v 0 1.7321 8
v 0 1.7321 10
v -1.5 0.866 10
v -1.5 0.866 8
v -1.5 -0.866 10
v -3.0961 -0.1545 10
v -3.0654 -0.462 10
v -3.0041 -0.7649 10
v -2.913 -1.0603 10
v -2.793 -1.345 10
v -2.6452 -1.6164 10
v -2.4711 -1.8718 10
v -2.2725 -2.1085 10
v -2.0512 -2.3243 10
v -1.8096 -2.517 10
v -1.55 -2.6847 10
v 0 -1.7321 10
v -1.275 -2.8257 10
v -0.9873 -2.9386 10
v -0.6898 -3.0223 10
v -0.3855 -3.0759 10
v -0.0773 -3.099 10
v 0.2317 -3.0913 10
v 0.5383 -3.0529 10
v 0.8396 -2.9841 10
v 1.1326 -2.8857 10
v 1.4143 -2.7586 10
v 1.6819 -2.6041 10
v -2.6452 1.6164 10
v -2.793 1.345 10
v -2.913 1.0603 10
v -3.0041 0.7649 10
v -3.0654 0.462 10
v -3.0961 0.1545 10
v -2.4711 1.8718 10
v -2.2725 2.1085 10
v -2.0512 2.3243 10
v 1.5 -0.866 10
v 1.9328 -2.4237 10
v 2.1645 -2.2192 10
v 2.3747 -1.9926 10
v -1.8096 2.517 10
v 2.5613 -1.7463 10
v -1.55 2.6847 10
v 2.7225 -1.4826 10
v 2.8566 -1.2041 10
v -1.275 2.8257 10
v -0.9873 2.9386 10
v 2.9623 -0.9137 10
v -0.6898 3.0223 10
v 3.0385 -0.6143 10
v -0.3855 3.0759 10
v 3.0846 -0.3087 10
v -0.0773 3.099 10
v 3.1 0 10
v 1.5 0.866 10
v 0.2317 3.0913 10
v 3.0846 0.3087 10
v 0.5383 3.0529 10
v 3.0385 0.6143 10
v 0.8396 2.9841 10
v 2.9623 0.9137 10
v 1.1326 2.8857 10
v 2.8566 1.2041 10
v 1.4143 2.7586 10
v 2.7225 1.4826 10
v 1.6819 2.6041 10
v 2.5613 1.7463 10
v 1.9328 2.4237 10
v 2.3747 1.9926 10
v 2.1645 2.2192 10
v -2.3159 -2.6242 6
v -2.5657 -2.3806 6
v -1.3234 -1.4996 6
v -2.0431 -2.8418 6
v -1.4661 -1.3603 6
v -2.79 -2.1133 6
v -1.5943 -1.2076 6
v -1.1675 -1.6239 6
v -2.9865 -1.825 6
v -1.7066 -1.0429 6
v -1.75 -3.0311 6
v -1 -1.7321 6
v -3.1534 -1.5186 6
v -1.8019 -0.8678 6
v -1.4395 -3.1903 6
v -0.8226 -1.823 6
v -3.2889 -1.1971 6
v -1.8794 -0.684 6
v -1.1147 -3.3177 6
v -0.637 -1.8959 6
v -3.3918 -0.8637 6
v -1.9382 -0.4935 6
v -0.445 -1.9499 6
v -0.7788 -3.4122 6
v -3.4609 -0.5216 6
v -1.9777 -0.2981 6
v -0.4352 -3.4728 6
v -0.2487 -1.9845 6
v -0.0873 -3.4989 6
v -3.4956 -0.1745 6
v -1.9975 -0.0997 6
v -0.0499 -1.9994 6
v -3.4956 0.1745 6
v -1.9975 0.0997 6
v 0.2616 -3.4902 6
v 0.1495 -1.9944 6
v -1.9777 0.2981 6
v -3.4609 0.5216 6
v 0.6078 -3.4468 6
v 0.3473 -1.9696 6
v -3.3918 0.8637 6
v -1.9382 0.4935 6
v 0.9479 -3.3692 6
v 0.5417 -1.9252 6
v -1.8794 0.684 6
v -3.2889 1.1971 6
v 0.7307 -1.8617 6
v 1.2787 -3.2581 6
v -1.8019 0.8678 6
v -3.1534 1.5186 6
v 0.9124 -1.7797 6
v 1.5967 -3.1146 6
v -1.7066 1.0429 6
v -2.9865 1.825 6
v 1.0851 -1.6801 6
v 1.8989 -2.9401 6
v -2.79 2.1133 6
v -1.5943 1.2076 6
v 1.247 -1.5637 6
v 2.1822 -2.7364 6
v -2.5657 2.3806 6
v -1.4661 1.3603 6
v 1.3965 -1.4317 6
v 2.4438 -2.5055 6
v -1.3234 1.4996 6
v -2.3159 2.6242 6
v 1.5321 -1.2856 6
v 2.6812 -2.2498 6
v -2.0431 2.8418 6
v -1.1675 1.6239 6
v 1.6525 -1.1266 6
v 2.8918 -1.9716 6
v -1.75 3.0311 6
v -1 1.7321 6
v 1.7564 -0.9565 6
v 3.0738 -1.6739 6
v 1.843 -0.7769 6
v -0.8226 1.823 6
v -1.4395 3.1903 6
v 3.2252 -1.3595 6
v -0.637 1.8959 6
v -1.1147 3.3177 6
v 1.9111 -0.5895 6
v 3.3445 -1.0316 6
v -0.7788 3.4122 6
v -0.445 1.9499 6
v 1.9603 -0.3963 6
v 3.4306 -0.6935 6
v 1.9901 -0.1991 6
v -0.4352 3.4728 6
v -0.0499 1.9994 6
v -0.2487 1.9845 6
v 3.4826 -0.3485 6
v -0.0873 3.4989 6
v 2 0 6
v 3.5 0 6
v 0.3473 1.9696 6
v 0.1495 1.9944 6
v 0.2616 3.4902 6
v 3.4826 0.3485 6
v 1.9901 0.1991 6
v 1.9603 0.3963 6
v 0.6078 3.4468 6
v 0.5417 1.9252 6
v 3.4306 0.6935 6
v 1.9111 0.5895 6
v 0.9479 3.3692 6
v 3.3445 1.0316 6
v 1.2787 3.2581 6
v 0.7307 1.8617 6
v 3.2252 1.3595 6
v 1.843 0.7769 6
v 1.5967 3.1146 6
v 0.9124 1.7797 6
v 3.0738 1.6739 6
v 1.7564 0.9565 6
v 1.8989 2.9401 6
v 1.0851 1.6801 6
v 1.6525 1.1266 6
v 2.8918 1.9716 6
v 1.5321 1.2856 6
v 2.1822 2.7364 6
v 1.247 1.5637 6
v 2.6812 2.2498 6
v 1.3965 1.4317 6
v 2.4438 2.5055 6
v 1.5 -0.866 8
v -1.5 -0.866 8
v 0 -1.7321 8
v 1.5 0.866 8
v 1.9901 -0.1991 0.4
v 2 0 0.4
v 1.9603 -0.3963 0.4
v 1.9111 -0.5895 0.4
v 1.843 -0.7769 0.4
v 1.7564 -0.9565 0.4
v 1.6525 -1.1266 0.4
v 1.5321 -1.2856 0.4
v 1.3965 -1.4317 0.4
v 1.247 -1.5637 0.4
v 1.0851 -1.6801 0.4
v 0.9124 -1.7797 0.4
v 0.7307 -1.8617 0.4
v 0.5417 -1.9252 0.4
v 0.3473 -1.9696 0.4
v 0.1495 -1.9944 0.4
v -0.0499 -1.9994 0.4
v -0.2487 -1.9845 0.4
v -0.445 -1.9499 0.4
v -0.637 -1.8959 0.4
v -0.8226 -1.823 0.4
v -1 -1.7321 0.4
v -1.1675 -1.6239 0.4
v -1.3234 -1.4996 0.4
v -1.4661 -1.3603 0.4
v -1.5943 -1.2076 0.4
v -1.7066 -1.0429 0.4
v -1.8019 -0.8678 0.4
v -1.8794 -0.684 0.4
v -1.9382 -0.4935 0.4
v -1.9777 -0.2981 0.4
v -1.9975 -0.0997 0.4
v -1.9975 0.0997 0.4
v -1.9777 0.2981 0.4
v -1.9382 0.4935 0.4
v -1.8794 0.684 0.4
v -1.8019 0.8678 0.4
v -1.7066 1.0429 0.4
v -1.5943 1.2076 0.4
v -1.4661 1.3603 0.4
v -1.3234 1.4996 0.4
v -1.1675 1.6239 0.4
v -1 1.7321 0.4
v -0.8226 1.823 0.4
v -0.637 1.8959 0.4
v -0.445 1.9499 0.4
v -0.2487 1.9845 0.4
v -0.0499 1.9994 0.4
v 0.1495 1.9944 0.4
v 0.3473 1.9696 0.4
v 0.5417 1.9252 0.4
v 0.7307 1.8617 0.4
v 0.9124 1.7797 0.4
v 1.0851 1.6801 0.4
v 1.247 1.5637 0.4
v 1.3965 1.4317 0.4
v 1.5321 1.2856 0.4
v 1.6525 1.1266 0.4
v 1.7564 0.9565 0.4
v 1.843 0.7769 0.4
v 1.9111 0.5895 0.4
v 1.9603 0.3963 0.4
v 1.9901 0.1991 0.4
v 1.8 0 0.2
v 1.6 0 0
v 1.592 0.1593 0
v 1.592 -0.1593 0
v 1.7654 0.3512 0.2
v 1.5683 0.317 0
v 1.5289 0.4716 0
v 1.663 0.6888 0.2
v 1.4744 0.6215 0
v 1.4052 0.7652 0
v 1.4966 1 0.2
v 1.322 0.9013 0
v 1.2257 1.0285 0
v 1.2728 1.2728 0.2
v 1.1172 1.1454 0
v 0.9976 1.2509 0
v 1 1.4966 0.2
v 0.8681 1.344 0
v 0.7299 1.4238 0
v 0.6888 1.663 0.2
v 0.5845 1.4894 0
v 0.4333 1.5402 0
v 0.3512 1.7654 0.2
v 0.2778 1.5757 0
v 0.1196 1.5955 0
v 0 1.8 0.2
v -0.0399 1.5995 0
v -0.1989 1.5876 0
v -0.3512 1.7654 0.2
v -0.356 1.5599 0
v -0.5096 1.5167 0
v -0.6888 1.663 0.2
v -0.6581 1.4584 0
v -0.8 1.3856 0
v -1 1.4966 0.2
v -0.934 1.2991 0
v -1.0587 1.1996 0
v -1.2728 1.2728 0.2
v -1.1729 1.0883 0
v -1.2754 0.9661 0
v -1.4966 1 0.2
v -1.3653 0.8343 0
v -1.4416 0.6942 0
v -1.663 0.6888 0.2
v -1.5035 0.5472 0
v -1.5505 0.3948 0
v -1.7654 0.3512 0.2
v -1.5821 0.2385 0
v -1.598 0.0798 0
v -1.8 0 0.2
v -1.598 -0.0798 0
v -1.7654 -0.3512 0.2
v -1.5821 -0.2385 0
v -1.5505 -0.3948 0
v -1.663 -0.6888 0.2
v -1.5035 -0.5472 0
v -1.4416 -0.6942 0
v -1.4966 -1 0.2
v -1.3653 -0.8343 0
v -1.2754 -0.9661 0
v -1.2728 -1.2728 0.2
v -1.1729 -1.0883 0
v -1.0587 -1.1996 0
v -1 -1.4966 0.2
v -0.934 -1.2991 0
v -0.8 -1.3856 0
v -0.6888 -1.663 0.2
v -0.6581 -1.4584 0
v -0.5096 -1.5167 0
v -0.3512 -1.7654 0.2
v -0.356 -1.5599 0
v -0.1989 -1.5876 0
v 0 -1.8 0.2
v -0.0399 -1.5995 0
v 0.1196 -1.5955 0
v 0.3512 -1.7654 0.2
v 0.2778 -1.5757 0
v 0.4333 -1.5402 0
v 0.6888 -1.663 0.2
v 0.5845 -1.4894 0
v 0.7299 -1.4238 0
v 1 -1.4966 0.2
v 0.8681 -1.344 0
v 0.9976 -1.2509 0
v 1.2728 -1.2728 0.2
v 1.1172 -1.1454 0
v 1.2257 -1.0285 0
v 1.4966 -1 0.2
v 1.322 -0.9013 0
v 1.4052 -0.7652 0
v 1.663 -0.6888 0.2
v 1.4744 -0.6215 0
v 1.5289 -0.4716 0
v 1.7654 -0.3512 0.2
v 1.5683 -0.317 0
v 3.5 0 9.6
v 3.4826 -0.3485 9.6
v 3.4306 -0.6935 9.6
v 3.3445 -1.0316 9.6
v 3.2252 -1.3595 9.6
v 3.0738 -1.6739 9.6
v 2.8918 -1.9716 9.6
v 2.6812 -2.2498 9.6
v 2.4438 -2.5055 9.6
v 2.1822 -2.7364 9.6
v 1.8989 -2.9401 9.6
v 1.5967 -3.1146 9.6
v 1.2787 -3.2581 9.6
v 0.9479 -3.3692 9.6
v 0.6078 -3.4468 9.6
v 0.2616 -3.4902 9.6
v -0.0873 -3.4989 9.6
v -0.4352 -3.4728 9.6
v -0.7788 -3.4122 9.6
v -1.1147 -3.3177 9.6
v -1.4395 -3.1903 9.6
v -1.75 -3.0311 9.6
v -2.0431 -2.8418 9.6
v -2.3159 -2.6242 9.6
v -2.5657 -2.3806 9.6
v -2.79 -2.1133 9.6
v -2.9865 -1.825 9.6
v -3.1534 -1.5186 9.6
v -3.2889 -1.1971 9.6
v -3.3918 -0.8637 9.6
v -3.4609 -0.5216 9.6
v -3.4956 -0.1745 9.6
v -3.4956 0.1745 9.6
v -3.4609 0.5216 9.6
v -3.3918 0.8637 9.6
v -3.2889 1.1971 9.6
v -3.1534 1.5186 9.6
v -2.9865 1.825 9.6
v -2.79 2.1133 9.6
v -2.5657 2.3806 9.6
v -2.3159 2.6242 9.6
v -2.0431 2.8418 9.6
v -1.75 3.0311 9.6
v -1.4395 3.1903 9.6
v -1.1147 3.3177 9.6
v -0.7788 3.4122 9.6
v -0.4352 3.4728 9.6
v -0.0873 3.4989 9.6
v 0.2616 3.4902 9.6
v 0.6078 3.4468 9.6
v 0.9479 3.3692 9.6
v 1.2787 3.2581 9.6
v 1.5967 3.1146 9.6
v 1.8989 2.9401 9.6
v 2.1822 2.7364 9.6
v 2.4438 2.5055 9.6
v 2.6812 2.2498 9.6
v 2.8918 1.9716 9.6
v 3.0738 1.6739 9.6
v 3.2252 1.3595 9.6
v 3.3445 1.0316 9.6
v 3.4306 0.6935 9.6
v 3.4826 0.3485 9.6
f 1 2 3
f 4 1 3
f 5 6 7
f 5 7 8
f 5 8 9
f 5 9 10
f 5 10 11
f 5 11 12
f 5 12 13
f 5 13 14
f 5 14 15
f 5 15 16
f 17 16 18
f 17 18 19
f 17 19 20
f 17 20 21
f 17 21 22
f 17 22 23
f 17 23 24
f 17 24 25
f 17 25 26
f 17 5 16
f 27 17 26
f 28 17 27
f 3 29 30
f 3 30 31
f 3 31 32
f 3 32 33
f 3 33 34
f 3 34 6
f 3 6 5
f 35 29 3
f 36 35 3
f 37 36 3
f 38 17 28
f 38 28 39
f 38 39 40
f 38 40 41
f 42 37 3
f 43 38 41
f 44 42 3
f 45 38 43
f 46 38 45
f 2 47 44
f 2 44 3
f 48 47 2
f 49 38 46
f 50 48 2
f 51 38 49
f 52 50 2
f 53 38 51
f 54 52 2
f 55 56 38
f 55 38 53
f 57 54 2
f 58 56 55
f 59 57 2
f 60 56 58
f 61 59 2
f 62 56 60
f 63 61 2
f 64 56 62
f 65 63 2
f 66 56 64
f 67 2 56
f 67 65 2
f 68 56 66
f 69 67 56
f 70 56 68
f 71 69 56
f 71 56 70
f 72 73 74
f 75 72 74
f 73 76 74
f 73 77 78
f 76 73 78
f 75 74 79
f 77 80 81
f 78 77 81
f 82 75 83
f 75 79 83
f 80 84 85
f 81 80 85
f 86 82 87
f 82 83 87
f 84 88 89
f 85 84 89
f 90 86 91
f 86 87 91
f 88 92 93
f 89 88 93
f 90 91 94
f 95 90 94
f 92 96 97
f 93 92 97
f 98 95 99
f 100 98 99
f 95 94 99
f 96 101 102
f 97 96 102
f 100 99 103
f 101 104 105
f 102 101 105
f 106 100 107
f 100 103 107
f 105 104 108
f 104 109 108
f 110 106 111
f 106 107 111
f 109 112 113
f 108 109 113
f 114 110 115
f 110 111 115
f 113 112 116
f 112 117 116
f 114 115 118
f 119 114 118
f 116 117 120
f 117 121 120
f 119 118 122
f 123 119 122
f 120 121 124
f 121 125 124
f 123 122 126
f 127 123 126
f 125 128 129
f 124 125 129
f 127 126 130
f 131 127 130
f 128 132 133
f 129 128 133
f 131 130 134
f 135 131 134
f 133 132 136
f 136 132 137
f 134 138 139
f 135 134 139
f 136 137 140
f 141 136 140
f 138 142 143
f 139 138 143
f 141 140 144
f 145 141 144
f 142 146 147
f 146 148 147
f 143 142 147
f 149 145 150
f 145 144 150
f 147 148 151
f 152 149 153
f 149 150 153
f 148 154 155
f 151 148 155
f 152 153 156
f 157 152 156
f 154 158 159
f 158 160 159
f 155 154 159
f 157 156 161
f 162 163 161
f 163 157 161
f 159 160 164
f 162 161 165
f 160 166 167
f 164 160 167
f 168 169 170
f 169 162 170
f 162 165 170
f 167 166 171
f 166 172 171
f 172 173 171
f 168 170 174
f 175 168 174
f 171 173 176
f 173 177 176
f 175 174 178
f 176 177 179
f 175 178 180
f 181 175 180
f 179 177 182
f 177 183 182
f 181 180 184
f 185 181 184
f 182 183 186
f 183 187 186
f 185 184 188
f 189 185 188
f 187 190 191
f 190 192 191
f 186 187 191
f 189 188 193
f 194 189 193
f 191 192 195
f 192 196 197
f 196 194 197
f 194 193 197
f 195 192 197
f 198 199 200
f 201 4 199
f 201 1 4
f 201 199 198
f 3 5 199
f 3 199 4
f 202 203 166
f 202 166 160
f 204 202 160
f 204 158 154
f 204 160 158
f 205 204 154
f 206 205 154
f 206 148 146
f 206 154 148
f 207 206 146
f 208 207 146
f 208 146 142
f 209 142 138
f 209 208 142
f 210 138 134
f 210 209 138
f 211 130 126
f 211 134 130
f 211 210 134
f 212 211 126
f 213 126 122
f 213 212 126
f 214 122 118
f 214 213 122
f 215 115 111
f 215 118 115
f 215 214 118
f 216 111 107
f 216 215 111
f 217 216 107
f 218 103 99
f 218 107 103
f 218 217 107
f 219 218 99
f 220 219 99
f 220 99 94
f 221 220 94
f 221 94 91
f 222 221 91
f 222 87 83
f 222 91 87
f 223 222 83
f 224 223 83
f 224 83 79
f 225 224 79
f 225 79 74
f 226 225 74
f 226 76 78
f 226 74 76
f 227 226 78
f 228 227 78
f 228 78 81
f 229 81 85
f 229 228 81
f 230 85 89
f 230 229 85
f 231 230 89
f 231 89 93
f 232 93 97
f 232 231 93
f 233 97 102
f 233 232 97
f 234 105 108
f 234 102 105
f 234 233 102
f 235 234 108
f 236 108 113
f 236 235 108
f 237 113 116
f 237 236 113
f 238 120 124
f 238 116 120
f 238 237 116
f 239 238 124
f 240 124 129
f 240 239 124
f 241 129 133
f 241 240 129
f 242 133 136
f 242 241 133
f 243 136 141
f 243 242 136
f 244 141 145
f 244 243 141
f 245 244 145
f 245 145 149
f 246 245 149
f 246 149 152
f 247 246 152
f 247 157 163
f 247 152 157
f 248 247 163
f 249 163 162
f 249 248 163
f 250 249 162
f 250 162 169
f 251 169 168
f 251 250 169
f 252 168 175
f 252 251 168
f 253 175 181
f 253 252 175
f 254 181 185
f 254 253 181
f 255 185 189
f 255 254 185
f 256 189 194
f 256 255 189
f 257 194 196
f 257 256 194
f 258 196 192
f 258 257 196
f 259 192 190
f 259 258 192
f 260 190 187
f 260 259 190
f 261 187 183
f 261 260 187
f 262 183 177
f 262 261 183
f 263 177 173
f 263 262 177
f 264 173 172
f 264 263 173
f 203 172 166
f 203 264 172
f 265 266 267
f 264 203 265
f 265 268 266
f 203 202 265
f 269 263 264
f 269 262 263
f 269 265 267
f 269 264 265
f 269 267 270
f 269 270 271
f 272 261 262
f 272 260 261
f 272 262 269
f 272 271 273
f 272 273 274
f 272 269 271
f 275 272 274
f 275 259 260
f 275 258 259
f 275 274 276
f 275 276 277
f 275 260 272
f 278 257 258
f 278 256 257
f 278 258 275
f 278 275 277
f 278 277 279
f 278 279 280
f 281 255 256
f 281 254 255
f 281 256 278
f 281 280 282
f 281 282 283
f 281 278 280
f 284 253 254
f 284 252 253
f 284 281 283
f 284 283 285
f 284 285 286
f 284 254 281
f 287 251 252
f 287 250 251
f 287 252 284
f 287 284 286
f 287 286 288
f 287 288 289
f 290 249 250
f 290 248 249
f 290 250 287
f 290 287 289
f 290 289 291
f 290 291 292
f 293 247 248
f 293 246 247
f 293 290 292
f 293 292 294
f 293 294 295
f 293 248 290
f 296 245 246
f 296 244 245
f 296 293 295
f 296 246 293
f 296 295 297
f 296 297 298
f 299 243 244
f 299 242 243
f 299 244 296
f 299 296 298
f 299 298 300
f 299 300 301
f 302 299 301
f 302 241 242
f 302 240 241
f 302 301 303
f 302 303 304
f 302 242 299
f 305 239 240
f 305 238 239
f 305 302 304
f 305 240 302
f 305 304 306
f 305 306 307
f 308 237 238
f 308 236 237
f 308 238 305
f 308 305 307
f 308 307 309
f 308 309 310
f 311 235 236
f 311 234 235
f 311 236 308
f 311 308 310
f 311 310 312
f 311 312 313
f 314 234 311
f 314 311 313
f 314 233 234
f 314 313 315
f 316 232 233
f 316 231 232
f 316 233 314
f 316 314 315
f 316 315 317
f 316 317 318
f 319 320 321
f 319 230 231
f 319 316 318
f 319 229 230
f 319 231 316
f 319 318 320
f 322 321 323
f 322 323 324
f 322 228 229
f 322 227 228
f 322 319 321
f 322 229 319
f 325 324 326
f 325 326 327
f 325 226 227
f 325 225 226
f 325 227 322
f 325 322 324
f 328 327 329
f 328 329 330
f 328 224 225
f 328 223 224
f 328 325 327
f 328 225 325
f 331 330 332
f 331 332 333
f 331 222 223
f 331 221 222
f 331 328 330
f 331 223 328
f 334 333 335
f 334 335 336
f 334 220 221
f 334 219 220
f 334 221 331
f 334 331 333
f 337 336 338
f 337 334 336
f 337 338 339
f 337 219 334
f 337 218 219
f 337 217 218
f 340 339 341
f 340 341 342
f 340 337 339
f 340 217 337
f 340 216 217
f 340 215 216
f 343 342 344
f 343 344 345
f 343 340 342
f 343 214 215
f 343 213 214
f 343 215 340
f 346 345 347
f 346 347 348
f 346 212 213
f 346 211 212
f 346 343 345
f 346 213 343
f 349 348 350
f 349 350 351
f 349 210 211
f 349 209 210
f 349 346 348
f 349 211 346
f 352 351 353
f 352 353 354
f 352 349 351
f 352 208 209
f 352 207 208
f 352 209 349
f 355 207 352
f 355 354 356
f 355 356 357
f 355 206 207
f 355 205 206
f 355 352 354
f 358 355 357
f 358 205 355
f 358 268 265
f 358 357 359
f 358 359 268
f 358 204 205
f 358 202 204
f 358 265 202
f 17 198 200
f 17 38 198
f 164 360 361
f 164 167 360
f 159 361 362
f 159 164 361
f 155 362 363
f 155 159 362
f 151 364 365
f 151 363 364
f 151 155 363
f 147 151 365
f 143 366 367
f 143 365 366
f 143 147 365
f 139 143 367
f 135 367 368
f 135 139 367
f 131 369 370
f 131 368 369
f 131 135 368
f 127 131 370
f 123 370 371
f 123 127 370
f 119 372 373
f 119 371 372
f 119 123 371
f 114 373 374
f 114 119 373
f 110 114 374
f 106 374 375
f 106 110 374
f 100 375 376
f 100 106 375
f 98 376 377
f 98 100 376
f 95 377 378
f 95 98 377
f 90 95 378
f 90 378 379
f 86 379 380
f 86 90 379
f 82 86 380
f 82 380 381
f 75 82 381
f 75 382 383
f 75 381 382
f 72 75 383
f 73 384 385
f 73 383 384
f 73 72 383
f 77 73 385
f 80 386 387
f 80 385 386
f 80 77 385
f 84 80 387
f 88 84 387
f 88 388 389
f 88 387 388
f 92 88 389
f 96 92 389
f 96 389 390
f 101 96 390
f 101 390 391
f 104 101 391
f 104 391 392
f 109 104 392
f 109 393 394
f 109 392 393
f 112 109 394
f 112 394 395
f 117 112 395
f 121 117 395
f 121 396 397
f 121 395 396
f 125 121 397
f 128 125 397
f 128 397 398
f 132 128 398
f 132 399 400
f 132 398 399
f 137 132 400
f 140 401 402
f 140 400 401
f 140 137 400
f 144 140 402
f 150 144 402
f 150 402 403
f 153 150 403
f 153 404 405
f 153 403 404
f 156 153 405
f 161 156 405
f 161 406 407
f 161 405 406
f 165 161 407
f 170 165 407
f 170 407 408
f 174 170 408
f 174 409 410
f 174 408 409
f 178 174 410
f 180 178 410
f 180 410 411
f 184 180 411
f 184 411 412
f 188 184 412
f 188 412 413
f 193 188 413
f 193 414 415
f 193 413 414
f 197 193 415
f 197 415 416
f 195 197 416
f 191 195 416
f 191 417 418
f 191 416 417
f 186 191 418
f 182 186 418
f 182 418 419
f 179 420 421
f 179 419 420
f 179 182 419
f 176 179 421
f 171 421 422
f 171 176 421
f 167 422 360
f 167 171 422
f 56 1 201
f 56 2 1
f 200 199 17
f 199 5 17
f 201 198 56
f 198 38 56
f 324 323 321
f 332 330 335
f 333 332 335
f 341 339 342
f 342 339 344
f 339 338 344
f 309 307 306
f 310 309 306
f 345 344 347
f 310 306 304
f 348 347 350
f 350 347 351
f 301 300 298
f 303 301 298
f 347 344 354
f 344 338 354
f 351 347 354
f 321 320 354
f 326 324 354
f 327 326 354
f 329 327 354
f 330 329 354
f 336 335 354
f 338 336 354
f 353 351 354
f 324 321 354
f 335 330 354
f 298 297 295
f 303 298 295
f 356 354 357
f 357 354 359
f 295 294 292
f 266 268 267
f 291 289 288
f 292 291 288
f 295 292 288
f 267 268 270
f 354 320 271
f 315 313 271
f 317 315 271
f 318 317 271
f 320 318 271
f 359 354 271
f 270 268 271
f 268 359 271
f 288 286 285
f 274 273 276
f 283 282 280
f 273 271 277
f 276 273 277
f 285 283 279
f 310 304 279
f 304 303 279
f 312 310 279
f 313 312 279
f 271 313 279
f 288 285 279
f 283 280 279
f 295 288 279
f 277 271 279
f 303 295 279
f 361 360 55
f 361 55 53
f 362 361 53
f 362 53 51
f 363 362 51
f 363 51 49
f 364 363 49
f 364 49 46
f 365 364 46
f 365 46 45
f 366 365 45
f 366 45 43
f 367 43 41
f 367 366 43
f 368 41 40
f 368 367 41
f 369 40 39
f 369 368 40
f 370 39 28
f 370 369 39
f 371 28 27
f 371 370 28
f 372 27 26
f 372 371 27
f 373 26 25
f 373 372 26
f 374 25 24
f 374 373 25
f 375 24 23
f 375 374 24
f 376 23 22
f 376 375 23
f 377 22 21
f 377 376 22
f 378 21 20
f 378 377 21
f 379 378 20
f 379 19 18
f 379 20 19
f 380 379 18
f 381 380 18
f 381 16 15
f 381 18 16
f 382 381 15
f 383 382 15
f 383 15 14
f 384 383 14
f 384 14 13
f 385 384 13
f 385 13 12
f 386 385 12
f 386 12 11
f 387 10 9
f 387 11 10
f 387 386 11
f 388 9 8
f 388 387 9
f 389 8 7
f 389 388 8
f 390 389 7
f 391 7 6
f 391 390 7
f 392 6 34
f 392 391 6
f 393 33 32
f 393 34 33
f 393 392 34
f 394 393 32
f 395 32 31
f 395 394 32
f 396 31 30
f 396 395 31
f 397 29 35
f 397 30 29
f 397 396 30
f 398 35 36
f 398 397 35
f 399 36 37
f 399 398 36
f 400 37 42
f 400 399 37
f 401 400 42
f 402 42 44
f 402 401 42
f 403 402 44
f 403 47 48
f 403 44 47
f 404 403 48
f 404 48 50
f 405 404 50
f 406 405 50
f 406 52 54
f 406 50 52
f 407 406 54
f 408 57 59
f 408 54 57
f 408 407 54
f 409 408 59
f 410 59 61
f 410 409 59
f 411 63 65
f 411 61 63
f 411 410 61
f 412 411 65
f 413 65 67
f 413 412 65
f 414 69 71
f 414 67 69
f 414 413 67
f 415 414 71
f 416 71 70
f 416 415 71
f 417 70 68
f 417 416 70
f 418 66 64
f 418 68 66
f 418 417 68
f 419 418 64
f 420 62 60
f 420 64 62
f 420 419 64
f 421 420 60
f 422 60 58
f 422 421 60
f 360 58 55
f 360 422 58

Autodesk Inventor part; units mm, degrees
ref_plane "YZ Plane" through (0, 0, 0) normal (1, 0, 0) x (0, 1, 0)
ref_plane "XZ Plane" through (0, 0, 0) normal (0, 1, 0) x (-1, 0, 0)
ref_plane "XY Plane" through (0, 0, 0) normal (0, 0, 1) x (1, 0, 0)
sketch "Sketch1" plane through (0, 0, 0) normal (0, 0, 1) x (1, 0, 0)
  circle A0 centre (0, 0) radius 2
  dimension "Diameter" = 4
extrude "Extrusion1" add sketch "Sketch1" along normal blind 6
sketch "Sketch2" plane through (0, 0, 6) normal (0, 0, 1) x (1, 0, 0)
  circle A0 centre (0, 0) radius 2 projected
  circle A1 centre (0, 0) radius 3.5
  dimension "Head_Diameter" = 7
extrude "Extrusion2" add sketch "Sketch2" along normal blind 4 contours A0 | A1
sketch "Sketch3" plane through (0, 0, 10) normal (0, 0, 1) x (1, 0, 0)
  circle A0 centre (0, 0) radius 3.5 projected
  circle A1 centre (0, 0) radius 1.7321 construction
  line L0 (0, 1.7321) -> (1.5, 0.866)
  line L1 (1.5, -0.866) -> (1.5, 0.866)
  line L2 (0, 1.7321) -> (-1.5, 0.866)
  line L3 (-1.5, -0.866) -> (-1.5, 0.866)
  line L4 (-1.5, -0.866) -> (0, -1.7321)
  line L5 (1.5, -0.866) -> (0, -1.7321)
  dimension "Hex_Width" = 3
extrude "Extrusion3" cut sketch "Sketch3" against normal blind 2 contours L0 L1 L5 L4 L3 L2
thread "Thread1" size "M4x0.7" class "4g6g" standard "ANSI Metric M Profile" length 6
chamfer "Chamfer1" distance 0.4 angle 45 2 edges at (-3.5, 0, 10) (-2, 0, 0)
equation "\"d9\" = ThreadLength"
equation "\"d12\" = Chamfer"
equation "\"ThreadLength\" = 6"
equation "\"Chamfer\" = 0.4"
properties part number "SCREW,SOCKET HD,P,12.9,M4x0.7X6MM" material "Steel, MS"
